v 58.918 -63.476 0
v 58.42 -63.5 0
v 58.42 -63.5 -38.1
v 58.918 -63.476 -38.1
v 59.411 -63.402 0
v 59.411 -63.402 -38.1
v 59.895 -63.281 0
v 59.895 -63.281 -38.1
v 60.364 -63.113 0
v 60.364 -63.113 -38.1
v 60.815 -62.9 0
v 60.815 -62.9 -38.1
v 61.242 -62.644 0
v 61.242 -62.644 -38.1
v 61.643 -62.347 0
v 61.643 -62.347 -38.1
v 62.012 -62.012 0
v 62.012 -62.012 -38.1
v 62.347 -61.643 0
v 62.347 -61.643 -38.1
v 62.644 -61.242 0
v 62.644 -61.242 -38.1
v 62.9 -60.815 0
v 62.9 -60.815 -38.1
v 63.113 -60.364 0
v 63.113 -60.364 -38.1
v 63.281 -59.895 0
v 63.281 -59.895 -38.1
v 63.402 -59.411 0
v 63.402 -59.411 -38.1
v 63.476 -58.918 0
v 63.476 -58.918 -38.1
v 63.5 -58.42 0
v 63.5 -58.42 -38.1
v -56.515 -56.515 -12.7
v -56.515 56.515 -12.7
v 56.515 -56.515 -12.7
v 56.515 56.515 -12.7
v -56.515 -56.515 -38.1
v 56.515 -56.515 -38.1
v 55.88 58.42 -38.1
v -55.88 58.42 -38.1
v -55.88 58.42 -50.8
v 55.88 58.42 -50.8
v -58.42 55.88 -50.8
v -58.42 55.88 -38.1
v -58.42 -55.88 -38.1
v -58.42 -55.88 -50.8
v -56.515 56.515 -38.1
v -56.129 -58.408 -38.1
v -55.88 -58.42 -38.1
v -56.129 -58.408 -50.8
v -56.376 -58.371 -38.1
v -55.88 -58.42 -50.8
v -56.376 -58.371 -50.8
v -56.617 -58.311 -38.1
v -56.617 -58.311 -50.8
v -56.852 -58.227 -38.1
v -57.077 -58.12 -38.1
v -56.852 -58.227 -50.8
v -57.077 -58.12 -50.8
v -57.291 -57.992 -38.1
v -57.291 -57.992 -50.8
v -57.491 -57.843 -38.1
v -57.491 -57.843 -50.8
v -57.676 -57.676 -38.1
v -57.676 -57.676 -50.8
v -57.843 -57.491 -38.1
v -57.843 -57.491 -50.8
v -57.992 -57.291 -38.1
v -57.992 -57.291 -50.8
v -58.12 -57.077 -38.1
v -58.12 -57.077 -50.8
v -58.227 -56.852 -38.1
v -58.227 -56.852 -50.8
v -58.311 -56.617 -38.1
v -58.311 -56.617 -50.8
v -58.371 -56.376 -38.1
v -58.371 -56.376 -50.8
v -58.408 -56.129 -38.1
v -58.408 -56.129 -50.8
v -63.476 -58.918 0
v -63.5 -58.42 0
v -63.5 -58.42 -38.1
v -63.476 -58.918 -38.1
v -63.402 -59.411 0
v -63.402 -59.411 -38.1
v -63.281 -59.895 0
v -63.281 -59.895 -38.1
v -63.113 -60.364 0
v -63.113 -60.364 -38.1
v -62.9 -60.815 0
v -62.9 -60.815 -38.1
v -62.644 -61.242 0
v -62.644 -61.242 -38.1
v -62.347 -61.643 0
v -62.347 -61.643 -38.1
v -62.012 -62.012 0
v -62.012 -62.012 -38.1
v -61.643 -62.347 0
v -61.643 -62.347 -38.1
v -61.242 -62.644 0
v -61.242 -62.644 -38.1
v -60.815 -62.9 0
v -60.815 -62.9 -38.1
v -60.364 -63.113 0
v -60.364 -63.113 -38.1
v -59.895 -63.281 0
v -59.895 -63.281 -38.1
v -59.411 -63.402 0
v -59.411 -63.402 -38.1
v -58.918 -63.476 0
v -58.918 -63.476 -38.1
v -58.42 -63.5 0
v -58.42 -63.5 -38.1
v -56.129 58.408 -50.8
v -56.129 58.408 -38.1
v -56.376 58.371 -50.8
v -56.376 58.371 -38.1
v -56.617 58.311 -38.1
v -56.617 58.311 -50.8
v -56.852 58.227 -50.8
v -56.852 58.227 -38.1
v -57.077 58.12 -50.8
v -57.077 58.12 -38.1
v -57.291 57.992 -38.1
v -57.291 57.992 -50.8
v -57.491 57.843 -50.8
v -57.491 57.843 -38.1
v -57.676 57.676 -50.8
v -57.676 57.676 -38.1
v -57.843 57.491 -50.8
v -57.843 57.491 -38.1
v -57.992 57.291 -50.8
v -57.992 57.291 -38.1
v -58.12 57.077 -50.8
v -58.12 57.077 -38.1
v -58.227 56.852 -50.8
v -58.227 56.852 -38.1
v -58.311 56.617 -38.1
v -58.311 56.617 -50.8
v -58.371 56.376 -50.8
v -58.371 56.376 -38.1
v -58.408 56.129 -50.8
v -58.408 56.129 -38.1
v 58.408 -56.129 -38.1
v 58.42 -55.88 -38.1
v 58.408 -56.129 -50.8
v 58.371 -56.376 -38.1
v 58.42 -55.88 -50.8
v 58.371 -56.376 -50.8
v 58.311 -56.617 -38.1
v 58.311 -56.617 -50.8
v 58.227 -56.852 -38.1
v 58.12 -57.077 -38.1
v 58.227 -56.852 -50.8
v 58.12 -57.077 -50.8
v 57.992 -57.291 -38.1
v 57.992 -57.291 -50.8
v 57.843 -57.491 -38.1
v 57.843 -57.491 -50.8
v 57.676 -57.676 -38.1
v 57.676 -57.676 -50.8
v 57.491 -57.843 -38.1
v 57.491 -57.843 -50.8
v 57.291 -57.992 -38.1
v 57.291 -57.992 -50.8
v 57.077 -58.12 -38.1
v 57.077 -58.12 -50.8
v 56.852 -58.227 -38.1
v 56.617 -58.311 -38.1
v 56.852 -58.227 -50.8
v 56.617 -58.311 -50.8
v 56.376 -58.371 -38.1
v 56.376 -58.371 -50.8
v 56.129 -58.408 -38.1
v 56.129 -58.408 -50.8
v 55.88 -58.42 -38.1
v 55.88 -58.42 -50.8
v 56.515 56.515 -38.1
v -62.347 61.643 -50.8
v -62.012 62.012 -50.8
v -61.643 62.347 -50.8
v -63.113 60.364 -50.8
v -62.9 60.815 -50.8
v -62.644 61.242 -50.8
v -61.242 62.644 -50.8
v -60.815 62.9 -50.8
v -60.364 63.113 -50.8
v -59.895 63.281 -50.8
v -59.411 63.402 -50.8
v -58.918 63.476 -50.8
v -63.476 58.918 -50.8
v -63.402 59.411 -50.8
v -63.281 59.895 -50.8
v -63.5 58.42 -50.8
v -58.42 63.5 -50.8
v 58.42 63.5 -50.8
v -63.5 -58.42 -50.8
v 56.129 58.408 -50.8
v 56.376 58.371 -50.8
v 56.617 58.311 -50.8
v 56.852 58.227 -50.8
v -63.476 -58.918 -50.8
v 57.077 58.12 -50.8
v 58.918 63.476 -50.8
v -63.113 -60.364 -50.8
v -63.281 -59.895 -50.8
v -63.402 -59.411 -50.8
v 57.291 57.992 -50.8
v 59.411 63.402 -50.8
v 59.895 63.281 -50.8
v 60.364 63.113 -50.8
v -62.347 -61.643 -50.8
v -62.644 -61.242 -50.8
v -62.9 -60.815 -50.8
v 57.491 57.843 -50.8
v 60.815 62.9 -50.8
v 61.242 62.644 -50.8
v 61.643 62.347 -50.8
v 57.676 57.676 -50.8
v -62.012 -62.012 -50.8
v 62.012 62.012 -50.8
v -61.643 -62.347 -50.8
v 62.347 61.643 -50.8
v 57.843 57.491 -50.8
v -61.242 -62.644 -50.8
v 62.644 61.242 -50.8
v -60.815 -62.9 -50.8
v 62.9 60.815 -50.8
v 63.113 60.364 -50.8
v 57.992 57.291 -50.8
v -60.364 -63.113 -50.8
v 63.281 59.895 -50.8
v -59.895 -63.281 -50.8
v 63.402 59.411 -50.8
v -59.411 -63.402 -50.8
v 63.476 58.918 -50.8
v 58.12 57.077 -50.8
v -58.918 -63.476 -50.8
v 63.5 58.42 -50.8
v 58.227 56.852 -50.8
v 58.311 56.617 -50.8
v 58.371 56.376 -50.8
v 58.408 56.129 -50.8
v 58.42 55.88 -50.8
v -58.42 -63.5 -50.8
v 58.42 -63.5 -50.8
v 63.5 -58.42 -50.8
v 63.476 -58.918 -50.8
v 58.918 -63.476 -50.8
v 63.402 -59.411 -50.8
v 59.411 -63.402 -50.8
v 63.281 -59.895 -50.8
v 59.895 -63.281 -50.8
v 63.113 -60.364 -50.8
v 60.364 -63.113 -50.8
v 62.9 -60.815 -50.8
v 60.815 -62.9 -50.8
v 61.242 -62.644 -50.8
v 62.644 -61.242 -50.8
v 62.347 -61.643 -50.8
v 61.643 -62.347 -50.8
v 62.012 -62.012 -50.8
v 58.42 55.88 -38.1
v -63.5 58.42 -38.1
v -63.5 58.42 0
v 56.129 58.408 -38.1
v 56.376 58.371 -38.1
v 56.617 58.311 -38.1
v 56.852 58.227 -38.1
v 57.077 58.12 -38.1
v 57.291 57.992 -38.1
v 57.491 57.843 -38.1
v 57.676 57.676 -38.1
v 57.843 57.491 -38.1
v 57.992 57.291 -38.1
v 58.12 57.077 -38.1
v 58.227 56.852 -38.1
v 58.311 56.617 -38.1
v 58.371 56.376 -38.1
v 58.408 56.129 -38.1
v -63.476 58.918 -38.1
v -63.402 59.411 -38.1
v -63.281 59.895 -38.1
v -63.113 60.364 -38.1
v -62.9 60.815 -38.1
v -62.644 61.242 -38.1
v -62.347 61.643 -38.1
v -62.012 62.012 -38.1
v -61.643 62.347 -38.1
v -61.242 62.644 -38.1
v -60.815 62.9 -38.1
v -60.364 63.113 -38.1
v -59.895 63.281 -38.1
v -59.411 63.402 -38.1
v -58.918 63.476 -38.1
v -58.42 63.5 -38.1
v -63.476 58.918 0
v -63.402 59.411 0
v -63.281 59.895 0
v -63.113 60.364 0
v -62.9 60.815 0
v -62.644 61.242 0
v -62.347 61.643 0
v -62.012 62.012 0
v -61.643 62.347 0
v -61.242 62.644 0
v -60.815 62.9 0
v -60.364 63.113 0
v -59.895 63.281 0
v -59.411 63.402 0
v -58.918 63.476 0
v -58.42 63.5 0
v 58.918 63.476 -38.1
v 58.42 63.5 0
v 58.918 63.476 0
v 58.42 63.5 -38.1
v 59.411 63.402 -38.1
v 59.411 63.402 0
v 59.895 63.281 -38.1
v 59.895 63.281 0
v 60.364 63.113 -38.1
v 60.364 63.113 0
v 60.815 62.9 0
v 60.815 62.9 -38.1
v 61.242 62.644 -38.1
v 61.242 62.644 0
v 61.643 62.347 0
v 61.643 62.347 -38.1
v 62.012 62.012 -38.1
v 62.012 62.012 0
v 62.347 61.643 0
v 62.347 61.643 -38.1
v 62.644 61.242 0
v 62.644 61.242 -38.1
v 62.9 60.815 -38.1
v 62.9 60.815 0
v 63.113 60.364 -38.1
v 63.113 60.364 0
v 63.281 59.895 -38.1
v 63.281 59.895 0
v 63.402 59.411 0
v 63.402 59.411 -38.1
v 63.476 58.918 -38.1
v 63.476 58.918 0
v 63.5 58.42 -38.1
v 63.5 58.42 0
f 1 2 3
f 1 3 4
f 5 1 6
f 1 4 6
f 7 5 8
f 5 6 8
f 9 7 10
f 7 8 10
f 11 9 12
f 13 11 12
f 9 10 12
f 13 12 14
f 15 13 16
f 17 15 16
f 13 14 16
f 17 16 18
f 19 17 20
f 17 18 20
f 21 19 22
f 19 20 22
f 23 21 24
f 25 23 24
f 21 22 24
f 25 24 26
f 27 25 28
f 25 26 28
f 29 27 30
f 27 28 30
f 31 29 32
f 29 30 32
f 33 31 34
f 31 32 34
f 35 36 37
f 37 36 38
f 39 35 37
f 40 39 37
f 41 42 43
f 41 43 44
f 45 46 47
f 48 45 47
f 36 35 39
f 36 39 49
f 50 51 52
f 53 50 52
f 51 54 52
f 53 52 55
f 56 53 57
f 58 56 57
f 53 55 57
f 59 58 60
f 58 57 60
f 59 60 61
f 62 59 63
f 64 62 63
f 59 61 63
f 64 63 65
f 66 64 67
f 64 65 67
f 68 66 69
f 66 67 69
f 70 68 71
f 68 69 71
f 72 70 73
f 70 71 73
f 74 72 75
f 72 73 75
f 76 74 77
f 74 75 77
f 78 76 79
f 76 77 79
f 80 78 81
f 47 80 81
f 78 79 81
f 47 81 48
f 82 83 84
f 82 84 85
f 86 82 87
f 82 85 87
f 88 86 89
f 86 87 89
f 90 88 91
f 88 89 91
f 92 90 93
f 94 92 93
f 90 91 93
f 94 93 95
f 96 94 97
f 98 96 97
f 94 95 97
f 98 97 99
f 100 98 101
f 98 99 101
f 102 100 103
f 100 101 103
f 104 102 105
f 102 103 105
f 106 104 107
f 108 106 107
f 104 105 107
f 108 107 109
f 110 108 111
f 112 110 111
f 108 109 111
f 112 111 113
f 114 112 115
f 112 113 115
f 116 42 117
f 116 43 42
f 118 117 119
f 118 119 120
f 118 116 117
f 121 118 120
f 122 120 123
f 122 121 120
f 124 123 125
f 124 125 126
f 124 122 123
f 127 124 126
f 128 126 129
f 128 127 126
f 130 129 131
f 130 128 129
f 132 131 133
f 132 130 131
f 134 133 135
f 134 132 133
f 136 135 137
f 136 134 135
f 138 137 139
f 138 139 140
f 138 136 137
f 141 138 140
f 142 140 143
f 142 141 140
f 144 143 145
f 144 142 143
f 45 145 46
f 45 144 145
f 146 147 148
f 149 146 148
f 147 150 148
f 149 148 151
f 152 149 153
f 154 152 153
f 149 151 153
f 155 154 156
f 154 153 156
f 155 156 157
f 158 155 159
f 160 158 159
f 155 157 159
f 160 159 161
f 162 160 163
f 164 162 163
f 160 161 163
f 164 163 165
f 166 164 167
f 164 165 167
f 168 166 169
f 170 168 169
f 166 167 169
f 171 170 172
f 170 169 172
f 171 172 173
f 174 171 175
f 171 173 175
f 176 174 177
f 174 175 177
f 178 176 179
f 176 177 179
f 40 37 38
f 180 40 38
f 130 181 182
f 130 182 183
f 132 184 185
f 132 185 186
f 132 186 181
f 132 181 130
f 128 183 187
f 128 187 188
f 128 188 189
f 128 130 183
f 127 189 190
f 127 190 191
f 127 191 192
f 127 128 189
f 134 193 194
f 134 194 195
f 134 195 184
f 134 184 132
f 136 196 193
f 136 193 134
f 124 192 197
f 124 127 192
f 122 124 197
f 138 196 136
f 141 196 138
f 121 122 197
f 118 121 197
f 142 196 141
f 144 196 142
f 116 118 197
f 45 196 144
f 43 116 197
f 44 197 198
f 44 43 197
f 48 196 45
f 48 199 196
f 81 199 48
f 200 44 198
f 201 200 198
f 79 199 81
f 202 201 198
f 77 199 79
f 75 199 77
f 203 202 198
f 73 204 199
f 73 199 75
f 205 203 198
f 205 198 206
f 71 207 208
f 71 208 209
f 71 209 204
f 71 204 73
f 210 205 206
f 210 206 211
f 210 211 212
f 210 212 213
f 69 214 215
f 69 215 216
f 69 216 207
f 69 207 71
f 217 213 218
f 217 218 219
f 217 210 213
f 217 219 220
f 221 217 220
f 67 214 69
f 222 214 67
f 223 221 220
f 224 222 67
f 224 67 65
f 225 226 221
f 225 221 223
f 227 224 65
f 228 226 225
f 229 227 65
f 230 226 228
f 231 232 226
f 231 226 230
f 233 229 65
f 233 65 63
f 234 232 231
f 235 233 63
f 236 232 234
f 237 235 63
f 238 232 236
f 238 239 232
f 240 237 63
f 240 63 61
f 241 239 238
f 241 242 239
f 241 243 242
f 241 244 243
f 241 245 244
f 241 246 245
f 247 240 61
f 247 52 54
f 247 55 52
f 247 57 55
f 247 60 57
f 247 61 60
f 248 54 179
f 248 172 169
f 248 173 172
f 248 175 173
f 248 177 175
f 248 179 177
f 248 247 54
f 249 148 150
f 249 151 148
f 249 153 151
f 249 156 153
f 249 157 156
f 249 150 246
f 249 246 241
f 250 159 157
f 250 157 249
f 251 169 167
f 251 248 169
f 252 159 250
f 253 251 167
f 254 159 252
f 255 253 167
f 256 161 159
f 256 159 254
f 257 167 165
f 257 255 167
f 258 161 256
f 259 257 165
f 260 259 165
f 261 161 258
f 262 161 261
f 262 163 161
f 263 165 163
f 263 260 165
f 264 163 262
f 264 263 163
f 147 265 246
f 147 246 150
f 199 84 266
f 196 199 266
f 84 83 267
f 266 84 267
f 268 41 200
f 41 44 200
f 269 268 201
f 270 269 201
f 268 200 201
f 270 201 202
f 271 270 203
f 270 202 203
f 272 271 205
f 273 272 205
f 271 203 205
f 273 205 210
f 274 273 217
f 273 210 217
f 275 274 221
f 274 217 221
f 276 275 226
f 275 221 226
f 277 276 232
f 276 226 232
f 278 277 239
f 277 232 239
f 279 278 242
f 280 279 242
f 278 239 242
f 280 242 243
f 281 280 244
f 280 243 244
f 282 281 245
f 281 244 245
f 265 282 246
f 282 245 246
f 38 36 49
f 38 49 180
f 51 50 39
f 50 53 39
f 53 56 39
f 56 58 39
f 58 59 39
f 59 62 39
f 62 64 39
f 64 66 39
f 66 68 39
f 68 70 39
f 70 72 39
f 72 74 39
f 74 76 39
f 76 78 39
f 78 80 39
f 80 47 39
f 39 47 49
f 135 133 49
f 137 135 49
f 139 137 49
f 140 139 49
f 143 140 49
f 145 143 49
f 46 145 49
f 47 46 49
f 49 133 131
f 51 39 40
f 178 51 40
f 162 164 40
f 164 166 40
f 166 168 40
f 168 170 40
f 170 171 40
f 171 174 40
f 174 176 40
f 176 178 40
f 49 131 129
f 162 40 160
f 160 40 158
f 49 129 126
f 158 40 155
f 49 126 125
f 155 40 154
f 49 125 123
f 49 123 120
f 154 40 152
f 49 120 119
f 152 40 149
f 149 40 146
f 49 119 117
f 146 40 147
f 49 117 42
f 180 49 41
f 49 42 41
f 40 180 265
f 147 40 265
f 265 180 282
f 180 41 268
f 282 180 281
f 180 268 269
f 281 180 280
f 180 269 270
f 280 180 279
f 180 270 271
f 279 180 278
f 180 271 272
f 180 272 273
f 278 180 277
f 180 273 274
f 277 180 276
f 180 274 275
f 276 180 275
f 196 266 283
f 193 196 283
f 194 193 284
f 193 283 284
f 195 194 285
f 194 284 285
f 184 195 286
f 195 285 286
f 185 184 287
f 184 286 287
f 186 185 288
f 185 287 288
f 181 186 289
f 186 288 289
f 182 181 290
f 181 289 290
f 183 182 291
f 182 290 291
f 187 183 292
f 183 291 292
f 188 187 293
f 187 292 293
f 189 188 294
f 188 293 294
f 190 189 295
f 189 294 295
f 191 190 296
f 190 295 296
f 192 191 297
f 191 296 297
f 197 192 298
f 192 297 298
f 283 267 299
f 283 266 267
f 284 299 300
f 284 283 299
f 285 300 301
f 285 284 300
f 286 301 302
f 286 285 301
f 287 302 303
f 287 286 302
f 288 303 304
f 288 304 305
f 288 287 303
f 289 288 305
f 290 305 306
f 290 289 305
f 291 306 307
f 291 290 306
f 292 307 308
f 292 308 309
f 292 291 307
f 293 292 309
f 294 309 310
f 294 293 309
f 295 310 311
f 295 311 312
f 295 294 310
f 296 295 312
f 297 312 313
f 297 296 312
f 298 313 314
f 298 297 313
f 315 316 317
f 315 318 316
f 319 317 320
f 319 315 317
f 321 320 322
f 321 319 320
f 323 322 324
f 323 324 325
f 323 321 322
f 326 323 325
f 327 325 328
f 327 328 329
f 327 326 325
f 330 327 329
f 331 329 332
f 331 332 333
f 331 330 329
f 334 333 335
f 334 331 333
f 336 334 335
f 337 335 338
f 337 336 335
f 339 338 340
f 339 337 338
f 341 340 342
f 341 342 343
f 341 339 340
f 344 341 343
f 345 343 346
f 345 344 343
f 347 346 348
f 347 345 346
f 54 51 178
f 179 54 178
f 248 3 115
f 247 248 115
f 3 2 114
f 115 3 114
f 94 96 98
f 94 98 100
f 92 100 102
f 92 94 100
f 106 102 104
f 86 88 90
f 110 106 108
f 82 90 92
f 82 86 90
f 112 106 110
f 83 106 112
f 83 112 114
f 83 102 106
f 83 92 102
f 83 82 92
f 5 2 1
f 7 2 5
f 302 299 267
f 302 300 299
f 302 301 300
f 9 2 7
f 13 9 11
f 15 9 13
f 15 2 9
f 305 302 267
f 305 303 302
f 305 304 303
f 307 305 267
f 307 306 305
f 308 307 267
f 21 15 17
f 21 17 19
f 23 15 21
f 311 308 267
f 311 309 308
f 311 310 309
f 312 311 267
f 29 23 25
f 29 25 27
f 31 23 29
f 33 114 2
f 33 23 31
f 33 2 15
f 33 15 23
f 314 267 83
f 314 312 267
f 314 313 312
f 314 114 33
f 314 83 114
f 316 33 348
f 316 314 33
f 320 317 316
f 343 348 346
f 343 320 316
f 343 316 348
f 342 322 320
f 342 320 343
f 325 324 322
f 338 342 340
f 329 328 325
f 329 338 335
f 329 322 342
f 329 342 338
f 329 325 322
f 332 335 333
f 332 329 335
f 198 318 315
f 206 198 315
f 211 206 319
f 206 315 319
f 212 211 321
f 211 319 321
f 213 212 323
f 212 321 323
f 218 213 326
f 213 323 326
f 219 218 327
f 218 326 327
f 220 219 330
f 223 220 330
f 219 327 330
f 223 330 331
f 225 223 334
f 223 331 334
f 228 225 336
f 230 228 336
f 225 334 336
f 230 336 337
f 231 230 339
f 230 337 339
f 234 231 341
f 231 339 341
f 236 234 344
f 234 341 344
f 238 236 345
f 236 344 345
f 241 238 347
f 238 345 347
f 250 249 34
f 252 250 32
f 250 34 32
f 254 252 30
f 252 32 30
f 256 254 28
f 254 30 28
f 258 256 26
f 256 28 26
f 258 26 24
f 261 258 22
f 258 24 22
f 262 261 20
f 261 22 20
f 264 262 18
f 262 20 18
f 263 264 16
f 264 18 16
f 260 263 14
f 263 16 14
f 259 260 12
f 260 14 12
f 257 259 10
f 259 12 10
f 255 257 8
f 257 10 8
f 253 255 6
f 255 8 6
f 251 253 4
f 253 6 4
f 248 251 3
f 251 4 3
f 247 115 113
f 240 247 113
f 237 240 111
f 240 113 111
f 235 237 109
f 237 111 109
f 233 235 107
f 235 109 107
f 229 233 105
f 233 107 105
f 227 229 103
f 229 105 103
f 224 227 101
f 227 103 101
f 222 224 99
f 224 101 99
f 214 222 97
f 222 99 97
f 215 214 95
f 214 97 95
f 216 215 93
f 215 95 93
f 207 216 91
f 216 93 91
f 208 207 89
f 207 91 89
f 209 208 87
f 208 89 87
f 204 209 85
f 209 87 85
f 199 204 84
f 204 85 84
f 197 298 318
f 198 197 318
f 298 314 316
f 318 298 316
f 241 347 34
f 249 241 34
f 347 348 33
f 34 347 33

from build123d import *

# Parameters (mm, degrees)
F0_W     = 127
F0_H     = 127
F0_W_2   = 113.03
F0_H_2   = 113.03
F1_DEPTH = 38.1
F2_W     = 113.03
F2_H     = 113.03
F3_DEPTH = 12.7
F4_R     = 5.08
F5_W     = 116.84
F5_H     = 116.84
F6_DEPTH = 12.7
F7_R     = 2.54


with BuildPart() as f1:
    # F0 (on Top) → F1 (new body)
    with BuildSketch(Plane.XY):
        Rectangle(F0_W, F0_H)
        Rectangle(F0_W_2, F0_H_2, mode=Mode.SUBTRACT)
    extrude(amount=-F1_DEPTH)

    # F2 (on Top) → F3 (join)
    with BuildSketch(Plane.XY):
        Rectangle(F2_W, F2_H)
    extrude(amount=-F3_DEPTH)

    # F4
    f4_edges = [f1.edges().sort_by_distance(p)[0] for p in [
        (-63.5, -63.5, -19.05),
        (-63.5, 63.5, -19.05),
        (63.5, 63.5, -19.05),
        (63.5, -63.5, -19.05),
    ]]
    fillet(f4_edges, radius=F4_R)

    # F5 (on face) → F6 (join)
    with BuildSketch(Plane(origin=(0, 0, -38.1), x_dir=(1, 0, 0), z_dir=(0, 0, -1))):
        with BuildLine():
            ThreePointArc((63.5, 58.42), (62.012102, 62.012102), (58.42, 63.5))
            Line((58.42, 63.5), (-58.42, 63.5))
            ThreePointArc((-58.42, 63.5), (-62.012102, 62.012102), (-63.5, 58.42))
            Line((-63.5, 58.42), (-63.5, -58.42))
            ThreePointArc((-63.5, -58.42), (-62.012102, -62.012102), (-58.42, -63.5))
            Line((-58.42, -63.5), (58.42, -63.5))
            ThreePointArc((58.42, -63.5), (62.012102, -62.012102), (63.5, -58.42))
            Line((63.5, -58.42), (63.5, 58.42))
        make_face()
        Rectangle(F5_W, F5_H, mode=Mode.SUBTRACT)
    extrude(amount=F6_DEPTH)

    # F7
    f7_edges = [f1.edges().sort_by_distance(p)[0] for p in [
        (-58.42, -58.42, -44.45),
        (58.42, -58.42, -44.45),
        (58.42, 58.42, -44.45),
        (-58.42, 58.42, -44.45),
    ]]
    fillet(f7_edges, radius=F7_R)


solid = f1.part
